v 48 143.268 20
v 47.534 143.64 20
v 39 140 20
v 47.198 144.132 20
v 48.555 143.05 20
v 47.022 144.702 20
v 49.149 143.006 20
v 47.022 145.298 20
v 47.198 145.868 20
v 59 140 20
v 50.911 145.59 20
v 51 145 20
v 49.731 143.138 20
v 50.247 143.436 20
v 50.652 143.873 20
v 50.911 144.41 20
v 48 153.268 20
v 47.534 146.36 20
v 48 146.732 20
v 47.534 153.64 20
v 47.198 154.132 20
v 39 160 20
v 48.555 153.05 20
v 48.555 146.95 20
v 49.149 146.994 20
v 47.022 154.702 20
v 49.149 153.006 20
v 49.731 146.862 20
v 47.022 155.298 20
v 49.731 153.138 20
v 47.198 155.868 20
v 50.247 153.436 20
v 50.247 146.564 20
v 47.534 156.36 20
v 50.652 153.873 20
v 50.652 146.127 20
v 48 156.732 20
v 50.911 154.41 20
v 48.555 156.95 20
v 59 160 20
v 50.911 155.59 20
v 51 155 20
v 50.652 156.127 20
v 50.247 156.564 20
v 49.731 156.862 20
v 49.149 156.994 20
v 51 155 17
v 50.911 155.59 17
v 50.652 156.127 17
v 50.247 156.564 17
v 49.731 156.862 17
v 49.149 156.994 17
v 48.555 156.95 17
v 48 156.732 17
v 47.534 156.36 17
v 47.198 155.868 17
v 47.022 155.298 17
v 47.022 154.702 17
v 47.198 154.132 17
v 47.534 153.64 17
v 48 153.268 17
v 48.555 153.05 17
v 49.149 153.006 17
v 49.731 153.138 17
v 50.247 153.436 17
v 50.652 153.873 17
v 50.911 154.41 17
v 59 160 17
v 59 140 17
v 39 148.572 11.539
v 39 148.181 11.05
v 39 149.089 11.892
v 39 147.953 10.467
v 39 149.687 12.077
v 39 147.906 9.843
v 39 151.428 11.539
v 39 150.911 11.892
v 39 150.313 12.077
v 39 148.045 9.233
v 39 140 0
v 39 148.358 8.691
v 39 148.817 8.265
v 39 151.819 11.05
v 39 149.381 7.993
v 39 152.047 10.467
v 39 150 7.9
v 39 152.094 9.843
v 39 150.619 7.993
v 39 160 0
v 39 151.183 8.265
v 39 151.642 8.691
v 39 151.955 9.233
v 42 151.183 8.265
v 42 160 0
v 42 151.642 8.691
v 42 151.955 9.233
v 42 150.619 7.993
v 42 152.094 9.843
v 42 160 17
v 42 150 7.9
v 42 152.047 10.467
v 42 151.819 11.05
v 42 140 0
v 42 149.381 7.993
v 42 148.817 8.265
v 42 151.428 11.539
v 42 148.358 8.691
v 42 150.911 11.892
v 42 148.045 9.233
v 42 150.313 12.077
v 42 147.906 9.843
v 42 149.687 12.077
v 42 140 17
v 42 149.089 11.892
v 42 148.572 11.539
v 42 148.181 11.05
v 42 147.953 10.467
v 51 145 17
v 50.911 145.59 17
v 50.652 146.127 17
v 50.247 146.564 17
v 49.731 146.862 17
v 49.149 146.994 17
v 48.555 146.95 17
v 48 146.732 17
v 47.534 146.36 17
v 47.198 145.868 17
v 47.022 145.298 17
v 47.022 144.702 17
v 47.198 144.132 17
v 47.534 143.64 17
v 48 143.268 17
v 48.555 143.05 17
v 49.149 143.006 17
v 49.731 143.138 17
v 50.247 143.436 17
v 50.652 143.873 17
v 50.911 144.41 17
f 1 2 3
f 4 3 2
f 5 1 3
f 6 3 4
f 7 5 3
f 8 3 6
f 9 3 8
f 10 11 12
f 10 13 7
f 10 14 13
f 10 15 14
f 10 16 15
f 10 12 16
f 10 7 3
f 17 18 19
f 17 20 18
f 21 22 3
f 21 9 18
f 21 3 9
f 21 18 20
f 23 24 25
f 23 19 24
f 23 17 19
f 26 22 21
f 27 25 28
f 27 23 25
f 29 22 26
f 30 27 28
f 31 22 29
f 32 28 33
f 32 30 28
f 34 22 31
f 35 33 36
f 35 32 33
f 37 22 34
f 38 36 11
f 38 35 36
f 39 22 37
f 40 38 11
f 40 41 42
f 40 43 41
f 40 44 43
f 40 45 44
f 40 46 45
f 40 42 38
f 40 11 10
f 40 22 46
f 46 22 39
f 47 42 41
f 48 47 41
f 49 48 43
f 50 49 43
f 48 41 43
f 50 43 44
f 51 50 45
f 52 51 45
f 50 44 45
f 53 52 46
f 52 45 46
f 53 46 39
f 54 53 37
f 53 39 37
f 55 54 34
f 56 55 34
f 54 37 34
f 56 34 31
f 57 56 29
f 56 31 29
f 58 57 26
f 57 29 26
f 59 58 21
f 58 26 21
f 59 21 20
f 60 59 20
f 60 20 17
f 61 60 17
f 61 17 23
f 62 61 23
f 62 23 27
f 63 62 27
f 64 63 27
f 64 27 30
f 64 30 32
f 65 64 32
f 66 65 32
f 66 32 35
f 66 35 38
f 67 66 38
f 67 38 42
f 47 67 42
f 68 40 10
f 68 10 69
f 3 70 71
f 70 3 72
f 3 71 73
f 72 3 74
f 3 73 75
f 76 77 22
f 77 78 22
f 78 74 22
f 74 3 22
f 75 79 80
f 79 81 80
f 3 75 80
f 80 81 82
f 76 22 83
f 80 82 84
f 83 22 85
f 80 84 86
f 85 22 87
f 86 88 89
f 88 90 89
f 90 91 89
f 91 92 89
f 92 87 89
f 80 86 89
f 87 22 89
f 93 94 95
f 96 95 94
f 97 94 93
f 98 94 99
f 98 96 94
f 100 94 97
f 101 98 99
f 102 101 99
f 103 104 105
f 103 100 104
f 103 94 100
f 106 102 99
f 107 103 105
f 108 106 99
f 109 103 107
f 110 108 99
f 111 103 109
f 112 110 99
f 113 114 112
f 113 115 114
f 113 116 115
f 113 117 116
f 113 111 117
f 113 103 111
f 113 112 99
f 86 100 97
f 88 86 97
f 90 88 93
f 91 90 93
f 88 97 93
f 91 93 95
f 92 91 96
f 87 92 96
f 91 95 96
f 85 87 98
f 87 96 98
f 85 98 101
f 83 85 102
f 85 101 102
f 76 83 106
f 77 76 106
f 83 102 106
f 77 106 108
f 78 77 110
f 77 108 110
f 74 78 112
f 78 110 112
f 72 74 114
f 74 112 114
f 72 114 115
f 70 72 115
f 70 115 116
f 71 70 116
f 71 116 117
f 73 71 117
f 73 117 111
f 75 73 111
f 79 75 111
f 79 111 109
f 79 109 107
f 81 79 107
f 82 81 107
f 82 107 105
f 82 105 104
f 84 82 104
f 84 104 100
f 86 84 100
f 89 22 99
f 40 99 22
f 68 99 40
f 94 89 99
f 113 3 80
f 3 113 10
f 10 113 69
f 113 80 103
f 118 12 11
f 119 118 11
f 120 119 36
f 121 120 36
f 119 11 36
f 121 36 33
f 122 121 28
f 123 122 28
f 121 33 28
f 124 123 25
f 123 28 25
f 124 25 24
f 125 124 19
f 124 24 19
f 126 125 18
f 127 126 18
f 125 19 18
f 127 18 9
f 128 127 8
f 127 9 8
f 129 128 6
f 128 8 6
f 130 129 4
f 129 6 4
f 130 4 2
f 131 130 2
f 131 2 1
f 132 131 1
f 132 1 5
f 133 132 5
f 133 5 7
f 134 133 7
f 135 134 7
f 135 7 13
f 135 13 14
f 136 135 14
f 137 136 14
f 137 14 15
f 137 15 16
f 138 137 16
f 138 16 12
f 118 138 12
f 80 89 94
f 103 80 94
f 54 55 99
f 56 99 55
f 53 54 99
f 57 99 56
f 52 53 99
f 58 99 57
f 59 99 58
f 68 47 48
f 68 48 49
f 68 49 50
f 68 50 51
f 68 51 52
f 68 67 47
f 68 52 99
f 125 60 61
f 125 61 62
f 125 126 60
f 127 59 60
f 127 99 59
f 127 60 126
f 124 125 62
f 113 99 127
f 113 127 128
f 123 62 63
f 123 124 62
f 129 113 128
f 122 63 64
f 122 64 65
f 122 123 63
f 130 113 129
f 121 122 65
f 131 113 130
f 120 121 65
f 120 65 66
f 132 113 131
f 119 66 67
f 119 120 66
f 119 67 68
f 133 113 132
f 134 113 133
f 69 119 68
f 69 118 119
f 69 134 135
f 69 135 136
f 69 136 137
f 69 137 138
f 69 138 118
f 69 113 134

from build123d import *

# Parameters (mm, degrees)
SKETCH_1_W                  = 20
SKETCH_1_H                  = 20
EXTRUDE_1_DEPTH             = 20
SKETCH_2_W                  = 17
SKETCH_2_H                  = 17
CUT_EXTRUDE_1_DEPTH         = 66.429351212
HOLE_WIZARD_4_2_4_2_1_D     = 4.2
HOLE_WIZARD_4_2_4_2_1_DEPTH = 20
HOLE_WIZARD_4_0_4_1_D       = 4


with BuildPart() as part:
    # 草图1 → 凸台-拉伸1 (new body)
    with BuildSketch(Plane(origin=(0, 160, 0), x_dir=(1, 0, 0), z_dir=(0, 1, 0))):
        with Locations((49, -10)):
            Rectangle(SKETCH_1_W, SKETCH_1_H)
    extrude(amount=-EXTRUDE_1_DEPTH)

    # 草图2 → 切除-拉伸1 (cut, through all)
    with BuildSketch(Plane.XZ.offset(-140)):
        with Locations((50.5, 8.5)):
            Rectangle(SKETCH_2_W, SKETCH_2_H)
    extrude(amount=-CUT_EXTRUDE_1_DEPTH, mode=Mode.SUBTRACT)

    # Ø4.2 (4.2) 直径孔1
    with Locations(Plane.ZY.offset(-39)):
        with Locations((10, 150)):
            Hole(HOLE_WIZARD_4_2_4_2_1_D / 2, depth=HOLE_WIZARD_4_2_4_2_1_DEPTH)

    # Ø4.0 (4) 直径孔1 (through all)
    with Locations(Plane(origin=(0, 0, 17), x_dir=(-1, 0, 0), z_dir=(0, 0, -1))):
        with Locations((-49, 145), (-49, 155)):
            Hole(HOLE_WIZARD_4_0_4_1_D / 2)


solid = part.part
